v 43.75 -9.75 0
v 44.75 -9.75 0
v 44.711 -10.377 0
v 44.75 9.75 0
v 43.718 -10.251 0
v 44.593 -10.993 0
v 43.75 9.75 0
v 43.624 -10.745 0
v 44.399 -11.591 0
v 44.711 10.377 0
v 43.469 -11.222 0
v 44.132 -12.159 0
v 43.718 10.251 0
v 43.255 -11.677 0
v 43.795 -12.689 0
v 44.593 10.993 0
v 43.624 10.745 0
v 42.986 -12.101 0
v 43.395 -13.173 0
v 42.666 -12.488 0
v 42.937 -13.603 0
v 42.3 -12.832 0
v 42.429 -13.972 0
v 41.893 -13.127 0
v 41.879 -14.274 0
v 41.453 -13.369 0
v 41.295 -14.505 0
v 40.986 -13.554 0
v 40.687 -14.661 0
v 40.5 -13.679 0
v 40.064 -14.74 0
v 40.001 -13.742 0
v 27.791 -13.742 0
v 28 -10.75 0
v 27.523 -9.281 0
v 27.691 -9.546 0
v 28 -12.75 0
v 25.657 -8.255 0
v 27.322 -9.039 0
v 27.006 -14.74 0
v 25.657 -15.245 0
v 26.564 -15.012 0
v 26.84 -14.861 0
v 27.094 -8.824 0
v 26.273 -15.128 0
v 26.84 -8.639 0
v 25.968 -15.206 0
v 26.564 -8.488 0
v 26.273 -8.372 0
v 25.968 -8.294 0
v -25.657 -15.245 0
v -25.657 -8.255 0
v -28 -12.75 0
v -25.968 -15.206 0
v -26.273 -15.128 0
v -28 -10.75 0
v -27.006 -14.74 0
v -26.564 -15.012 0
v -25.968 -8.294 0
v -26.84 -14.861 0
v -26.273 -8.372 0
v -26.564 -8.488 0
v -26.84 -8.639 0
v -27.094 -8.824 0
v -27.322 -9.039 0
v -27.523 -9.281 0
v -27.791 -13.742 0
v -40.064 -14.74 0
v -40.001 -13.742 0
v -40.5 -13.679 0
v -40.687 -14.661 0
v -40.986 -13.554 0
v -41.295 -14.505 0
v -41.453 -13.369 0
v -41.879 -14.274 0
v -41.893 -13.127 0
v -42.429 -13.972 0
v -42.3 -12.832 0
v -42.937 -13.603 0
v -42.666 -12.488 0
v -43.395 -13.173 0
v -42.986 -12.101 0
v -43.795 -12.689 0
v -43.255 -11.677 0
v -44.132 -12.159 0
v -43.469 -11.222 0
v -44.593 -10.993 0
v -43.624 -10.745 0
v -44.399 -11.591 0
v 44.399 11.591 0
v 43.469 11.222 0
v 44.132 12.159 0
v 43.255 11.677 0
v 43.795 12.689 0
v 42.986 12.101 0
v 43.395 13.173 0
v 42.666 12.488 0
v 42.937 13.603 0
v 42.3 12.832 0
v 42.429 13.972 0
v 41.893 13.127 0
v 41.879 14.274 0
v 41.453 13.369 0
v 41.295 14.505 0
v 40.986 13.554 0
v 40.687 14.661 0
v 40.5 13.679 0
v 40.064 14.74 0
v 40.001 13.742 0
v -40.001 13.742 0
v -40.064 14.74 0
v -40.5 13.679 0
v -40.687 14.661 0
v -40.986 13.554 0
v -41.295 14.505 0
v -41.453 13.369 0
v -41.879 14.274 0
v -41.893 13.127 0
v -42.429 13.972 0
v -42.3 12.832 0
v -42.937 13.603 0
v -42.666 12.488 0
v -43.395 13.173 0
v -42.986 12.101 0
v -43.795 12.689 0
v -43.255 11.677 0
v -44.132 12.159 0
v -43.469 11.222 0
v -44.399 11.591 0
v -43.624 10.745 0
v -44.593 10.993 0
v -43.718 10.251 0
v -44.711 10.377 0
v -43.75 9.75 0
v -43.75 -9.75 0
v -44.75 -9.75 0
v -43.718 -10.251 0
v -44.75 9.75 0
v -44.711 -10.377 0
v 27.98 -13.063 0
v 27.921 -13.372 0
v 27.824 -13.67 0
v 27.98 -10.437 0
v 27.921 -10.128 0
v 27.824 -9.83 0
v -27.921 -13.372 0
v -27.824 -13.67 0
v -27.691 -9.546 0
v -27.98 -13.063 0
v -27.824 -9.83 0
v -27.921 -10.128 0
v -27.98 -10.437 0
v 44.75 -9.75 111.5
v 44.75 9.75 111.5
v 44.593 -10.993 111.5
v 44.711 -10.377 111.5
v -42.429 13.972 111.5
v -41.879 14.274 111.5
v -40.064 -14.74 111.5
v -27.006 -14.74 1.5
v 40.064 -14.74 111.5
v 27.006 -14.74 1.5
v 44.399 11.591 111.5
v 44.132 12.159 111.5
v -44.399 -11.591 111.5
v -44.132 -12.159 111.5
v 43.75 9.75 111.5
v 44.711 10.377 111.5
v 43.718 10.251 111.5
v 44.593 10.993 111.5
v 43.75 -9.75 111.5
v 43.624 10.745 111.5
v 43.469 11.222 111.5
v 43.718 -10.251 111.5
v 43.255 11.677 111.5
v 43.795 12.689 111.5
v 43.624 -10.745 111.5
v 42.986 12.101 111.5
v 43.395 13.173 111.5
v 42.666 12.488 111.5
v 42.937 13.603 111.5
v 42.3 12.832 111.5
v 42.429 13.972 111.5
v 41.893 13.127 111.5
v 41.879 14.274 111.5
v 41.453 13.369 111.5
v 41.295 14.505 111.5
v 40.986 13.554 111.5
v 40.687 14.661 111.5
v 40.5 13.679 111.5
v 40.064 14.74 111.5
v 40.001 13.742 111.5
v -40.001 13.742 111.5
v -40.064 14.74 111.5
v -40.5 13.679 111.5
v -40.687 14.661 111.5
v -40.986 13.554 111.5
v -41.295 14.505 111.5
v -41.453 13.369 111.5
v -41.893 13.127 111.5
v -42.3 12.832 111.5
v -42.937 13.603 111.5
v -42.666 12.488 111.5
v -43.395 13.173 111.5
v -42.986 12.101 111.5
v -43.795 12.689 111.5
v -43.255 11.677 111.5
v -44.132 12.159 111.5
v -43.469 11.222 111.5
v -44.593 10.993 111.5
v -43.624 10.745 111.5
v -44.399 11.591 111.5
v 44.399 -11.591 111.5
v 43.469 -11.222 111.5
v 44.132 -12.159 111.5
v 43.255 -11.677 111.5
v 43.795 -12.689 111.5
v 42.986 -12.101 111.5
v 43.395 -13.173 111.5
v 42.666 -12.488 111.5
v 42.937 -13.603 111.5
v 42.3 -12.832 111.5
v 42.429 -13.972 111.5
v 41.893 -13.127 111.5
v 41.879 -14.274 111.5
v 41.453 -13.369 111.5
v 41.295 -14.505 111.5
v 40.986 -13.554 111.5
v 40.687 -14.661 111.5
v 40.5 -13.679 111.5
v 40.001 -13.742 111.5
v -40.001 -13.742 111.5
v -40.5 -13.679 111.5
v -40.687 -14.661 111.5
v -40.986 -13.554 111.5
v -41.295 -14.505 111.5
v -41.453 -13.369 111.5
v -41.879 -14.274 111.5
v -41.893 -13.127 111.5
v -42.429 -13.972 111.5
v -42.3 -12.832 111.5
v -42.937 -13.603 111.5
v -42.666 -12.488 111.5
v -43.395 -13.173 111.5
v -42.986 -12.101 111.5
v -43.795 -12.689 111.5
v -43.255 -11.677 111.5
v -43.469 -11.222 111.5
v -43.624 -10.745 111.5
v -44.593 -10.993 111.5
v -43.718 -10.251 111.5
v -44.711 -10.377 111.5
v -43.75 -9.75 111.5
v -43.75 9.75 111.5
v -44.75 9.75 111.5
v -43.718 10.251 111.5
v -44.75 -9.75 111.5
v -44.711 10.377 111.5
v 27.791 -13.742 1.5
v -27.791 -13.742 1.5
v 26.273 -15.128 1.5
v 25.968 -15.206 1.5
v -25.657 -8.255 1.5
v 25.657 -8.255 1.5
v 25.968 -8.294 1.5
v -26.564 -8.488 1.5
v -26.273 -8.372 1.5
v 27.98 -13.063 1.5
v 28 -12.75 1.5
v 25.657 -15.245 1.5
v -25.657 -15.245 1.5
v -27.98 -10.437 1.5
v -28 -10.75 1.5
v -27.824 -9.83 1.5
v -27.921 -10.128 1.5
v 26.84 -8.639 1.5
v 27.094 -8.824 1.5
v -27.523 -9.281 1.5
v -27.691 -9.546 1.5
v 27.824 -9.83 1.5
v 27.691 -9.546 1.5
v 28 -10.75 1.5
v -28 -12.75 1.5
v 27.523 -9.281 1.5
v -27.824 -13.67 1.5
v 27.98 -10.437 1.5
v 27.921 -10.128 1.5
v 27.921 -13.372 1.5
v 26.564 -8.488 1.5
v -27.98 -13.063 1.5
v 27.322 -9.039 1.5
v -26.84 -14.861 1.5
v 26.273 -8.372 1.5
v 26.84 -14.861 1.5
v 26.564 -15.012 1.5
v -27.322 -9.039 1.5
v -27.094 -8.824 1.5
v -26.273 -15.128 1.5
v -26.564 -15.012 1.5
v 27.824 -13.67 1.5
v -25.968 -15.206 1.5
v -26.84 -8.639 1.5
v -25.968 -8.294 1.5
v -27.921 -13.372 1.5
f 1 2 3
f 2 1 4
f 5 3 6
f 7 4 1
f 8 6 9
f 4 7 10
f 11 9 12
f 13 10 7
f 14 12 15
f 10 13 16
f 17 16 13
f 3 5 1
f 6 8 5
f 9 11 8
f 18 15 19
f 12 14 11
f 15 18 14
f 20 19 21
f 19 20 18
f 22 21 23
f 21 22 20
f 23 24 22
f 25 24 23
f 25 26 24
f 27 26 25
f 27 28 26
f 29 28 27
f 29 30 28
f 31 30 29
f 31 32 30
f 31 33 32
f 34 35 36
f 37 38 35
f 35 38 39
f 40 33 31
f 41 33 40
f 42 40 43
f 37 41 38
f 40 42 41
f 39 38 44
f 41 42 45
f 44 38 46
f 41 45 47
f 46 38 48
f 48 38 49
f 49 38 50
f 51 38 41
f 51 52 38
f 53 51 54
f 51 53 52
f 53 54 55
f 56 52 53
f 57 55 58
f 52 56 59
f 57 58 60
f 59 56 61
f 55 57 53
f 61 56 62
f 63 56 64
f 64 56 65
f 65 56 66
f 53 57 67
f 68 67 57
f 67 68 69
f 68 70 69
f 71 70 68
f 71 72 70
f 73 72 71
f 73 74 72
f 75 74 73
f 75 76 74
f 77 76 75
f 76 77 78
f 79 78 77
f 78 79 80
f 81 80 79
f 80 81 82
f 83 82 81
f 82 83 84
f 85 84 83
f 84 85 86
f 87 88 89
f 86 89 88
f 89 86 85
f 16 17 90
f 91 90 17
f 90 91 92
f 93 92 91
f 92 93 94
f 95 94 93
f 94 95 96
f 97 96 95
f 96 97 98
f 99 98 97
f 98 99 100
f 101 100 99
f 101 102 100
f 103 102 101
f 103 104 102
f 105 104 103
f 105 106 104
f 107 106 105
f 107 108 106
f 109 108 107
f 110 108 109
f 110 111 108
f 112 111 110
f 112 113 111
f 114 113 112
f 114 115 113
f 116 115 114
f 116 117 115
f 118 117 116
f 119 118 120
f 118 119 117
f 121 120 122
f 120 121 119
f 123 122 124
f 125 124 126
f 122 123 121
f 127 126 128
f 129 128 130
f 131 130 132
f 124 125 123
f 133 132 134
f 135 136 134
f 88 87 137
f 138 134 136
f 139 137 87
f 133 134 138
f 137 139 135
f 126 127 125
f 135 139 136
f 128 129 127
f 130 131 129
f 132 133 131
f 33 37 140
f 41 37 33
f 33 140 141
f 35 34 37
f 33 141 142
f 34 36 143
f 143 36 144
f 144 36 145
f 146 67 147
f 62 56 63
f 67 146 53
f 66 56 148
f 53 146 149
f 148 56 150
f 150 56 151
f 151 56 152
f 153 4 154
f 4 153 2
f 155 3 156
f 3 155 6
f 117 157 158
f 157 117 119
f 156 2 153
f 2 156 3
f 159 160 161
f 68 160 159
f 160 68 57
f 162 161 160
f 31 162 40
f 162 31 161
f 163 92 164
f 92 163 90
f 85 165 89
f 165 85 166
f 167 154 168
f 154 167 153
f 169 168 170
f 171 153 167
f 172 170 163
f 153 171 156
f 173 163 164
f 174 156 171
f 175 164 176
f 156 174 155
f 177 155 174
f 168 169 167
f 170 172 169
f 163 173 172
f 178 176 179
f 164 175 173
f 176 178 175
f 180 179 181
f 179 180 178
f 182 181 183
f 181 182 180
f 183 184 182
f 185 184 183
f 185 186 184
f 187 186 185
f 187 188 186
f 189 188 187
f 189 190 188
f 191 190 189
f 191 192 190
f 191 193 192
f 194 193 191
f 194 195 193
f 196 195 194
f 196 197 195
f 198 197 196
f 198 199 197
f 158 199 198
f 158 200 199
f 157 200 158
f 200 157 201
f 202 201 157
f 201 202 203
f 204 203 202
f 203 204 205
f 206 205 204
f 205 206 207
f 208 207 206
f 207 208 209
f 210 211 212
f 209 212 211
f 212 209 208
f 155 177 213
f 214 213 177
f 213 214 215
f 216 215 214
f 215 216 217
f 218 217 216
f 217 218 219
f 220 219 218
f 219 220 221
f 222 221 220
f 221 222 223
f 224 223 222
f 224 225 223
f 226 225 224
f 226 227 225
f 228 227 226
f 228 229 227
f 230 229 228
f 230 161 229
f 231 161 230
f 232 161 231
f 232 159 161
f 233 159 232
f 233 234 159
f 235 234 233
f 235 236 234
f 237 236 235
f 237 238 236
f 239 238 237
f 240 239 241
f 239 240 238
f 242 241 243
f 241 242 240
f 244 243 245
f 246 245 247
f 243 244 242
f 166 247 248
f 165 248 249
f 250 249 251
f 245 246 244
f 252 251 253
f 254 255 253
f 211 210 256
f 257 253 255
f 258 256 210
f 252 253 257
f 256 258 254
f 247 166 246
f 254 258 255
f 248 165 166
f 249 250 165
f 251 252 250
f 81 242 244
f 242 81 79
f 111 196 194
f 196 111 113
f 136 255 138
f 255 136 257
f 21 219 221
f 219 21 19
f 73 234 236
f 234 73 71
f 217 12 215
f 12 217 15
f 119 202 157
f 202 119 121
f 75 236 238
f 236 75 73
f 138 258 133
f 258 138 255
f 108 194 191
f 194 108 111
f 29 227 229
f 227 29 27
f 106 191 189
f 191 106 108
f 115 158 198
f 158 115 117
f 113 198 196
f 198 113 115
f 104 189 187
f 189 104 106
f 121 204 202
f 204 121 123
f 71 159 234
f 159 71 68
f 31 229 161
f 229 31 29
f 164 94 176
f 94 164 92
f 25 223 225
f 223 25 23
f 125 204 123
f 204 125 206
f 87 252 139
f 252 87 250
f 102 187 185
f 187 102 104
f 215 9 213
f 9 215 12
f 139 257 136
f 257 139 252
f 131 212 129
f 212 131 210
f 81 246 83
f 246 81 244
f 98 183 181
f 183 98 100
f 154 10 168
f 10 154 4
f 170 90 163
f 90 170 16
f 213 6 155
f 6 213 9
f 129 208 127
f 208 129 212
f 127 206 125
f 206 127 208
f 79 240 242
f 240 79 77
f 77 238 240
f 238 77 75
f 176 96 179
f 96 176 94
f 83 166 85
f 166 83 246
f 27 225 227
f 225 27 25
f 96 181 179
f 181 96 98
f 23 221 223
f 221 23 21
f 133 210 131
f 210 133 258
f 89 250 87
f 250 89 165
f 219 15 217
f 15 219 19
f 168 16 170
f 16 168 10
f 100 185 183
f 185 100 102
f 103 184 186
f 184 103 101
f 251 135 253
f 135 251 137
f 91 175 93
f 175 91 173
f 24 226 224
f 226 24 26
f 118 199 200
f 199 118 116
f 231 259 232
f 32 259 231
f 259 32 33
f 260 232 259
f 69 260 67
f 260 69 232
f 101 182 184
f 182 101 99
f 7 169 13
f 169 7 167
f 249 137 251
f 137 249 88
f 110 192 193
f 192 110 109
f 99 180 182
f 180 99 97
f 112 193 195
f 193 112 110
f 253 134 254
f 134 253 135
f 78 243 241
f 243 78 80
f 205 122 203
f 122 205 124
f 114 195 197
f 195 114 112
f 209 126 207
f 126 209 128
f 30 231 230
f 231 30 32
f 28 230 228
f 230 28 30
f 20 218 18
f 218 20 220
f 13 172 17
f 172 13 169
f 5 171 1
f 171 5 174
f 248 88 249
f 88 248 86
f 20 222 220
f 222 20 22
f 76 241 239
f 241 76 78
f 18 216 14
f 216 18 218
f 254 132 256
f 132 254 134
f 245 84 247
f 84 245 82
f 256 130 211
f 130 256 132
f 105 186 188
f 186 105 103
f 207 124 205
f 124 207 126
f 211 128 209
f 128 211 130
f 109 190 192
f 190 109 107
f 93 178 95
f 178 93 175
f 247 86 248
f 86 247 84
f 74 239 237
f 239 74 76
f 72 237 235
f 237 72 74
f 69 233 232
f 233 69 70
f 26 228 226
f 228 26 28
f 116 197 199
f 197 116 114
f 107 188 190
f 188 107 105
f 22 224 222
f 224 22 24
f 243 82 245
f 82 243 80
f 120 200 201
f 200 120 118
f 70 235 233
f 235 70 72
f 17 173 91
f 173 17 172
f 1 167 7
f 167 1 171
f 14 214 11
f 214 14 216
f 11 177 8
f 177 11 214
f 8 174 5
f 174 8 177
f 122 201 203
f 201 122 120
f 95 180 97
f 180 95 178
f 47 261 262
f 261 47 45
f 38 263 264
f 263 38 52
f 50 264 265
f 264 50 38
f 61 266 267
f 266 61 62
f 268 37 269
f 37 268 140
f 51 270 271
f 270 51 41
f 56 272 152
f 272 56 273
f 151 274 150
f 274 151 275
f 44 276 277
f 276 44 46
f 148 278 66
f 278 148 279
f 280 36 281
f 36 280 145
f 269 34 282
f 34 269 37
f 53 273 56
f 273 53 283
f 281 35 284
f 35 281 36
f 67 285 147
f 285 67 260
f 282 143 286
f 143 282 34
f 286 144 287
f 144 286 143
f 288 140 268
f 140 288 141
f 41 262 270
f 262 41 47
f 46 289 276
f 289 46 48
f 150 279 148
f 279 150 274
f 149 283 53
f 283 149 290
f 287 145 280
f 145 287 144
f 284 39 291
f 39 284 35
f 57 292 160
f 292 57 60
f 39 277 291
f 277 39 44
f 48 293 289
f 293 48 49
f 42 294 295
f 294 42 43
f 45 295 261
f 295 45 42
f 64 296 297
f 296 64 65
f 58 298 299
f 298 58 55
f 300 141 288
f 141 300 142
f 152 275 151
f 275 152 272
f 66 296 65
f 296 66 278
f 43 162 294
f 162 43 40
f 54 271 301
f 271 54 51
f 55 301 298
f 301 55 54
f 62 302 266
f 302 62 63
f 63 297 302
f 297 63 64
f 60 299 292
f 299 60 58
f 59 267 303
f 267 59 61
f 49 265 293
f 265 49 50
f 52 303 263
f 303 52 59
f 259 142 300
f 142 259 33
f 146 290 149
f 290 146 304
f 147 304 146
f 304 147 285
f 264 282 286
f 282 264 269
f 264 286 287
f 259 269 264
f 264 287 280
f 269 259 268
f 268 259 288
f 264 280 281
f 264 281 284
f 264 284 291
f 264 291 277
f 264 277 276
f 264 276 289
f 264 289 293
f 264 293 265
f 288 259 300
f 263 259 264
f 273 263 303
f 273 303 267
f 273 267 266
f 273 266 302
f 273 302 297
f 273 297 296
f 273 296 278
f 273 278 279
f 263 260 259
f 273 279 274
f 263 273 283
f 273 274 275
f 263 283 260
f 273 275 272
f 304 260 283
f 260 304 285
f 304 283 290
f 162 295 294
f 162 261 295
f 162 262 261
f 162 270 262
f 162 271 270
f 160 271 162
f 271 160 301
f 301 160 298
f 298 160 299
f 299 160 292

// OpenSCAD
$fn = 50;

union() {
	difference() {
		union() {
			translate(v = [0, 0, 3]) {
				rotate(a = [0, 0, 0]) {
					difference() {
						union() {
							#translate(v = [0, 0, -3.0]) {
								cylinder(h = 3, r = 1.5);
							}
							#translate(v = [0, 0, -1.9]) {
								cylinder(h = 1.9, r1 = 1.8, r2 = 3.6);
							}
							#translate(v = [0, 0, -3.0]) {
								cylinder(h = 3, r = 1.8);
							}
							#translate(v = [0, 0, -3.0]) {
								cylinder(h = 3, r = 1.5);
							}
						}
						union();
					}
				}
			}
			hull() {
				translate(v = [-39.75, 9.75, 0]) {
					cylinder(h = 111.5, r = 5);
				}
				translate(v = [39.75, 9.75, 0]) {
					cylinder(h = 111.5, r = 5);
				}
				translate(v = [-39.75, -9.75, 0]) {
					cylinder(h = 111.5, r = 5);
				}
				translate(v = [39.75, -9.75, 0]) {
					cylinder(h = 111.5, r = 5);
				}
			}
		}
		union() {
			##hull() {
				translate(v = [-39.75, 9.75, 0]) {
					cylinder(h = 111.5, r = 4);
				}
				translate(v = [39.75, 9.75, 0]) {
					cylinder(h = 111.5, r = 4);
				}
				translate(v = [-39.75, -9.75, 0]) {
					cylinder(h = 111.5, r = 4);
				}
				translate(v = [39.75, -9.75, 0]) {
					cylinder(h = 111.5, r = 4);
				}
			}
		}
	}
	union() {
		#translate(v = [0.0, -11.75, 0]) {
			#hull() {
				translate(v = [-25.5, 1.0, 0]) {
					cylinder(h = 1.5, r = 2.5);
				}
				translate(v = [25.5, 1.0, 0]) {
					cylinder(h = 1.5, r = 2.5);
				}
				translate(v = [-25.5, -1.0, 0]) {
					cylinder(h = 1.5, r = 2.5);
				}
				translate(v = [25.5, -1.0, 0]) {
					cylinder(h = 1.5, r = 2.5);
				}
			}
		}
	}
}
